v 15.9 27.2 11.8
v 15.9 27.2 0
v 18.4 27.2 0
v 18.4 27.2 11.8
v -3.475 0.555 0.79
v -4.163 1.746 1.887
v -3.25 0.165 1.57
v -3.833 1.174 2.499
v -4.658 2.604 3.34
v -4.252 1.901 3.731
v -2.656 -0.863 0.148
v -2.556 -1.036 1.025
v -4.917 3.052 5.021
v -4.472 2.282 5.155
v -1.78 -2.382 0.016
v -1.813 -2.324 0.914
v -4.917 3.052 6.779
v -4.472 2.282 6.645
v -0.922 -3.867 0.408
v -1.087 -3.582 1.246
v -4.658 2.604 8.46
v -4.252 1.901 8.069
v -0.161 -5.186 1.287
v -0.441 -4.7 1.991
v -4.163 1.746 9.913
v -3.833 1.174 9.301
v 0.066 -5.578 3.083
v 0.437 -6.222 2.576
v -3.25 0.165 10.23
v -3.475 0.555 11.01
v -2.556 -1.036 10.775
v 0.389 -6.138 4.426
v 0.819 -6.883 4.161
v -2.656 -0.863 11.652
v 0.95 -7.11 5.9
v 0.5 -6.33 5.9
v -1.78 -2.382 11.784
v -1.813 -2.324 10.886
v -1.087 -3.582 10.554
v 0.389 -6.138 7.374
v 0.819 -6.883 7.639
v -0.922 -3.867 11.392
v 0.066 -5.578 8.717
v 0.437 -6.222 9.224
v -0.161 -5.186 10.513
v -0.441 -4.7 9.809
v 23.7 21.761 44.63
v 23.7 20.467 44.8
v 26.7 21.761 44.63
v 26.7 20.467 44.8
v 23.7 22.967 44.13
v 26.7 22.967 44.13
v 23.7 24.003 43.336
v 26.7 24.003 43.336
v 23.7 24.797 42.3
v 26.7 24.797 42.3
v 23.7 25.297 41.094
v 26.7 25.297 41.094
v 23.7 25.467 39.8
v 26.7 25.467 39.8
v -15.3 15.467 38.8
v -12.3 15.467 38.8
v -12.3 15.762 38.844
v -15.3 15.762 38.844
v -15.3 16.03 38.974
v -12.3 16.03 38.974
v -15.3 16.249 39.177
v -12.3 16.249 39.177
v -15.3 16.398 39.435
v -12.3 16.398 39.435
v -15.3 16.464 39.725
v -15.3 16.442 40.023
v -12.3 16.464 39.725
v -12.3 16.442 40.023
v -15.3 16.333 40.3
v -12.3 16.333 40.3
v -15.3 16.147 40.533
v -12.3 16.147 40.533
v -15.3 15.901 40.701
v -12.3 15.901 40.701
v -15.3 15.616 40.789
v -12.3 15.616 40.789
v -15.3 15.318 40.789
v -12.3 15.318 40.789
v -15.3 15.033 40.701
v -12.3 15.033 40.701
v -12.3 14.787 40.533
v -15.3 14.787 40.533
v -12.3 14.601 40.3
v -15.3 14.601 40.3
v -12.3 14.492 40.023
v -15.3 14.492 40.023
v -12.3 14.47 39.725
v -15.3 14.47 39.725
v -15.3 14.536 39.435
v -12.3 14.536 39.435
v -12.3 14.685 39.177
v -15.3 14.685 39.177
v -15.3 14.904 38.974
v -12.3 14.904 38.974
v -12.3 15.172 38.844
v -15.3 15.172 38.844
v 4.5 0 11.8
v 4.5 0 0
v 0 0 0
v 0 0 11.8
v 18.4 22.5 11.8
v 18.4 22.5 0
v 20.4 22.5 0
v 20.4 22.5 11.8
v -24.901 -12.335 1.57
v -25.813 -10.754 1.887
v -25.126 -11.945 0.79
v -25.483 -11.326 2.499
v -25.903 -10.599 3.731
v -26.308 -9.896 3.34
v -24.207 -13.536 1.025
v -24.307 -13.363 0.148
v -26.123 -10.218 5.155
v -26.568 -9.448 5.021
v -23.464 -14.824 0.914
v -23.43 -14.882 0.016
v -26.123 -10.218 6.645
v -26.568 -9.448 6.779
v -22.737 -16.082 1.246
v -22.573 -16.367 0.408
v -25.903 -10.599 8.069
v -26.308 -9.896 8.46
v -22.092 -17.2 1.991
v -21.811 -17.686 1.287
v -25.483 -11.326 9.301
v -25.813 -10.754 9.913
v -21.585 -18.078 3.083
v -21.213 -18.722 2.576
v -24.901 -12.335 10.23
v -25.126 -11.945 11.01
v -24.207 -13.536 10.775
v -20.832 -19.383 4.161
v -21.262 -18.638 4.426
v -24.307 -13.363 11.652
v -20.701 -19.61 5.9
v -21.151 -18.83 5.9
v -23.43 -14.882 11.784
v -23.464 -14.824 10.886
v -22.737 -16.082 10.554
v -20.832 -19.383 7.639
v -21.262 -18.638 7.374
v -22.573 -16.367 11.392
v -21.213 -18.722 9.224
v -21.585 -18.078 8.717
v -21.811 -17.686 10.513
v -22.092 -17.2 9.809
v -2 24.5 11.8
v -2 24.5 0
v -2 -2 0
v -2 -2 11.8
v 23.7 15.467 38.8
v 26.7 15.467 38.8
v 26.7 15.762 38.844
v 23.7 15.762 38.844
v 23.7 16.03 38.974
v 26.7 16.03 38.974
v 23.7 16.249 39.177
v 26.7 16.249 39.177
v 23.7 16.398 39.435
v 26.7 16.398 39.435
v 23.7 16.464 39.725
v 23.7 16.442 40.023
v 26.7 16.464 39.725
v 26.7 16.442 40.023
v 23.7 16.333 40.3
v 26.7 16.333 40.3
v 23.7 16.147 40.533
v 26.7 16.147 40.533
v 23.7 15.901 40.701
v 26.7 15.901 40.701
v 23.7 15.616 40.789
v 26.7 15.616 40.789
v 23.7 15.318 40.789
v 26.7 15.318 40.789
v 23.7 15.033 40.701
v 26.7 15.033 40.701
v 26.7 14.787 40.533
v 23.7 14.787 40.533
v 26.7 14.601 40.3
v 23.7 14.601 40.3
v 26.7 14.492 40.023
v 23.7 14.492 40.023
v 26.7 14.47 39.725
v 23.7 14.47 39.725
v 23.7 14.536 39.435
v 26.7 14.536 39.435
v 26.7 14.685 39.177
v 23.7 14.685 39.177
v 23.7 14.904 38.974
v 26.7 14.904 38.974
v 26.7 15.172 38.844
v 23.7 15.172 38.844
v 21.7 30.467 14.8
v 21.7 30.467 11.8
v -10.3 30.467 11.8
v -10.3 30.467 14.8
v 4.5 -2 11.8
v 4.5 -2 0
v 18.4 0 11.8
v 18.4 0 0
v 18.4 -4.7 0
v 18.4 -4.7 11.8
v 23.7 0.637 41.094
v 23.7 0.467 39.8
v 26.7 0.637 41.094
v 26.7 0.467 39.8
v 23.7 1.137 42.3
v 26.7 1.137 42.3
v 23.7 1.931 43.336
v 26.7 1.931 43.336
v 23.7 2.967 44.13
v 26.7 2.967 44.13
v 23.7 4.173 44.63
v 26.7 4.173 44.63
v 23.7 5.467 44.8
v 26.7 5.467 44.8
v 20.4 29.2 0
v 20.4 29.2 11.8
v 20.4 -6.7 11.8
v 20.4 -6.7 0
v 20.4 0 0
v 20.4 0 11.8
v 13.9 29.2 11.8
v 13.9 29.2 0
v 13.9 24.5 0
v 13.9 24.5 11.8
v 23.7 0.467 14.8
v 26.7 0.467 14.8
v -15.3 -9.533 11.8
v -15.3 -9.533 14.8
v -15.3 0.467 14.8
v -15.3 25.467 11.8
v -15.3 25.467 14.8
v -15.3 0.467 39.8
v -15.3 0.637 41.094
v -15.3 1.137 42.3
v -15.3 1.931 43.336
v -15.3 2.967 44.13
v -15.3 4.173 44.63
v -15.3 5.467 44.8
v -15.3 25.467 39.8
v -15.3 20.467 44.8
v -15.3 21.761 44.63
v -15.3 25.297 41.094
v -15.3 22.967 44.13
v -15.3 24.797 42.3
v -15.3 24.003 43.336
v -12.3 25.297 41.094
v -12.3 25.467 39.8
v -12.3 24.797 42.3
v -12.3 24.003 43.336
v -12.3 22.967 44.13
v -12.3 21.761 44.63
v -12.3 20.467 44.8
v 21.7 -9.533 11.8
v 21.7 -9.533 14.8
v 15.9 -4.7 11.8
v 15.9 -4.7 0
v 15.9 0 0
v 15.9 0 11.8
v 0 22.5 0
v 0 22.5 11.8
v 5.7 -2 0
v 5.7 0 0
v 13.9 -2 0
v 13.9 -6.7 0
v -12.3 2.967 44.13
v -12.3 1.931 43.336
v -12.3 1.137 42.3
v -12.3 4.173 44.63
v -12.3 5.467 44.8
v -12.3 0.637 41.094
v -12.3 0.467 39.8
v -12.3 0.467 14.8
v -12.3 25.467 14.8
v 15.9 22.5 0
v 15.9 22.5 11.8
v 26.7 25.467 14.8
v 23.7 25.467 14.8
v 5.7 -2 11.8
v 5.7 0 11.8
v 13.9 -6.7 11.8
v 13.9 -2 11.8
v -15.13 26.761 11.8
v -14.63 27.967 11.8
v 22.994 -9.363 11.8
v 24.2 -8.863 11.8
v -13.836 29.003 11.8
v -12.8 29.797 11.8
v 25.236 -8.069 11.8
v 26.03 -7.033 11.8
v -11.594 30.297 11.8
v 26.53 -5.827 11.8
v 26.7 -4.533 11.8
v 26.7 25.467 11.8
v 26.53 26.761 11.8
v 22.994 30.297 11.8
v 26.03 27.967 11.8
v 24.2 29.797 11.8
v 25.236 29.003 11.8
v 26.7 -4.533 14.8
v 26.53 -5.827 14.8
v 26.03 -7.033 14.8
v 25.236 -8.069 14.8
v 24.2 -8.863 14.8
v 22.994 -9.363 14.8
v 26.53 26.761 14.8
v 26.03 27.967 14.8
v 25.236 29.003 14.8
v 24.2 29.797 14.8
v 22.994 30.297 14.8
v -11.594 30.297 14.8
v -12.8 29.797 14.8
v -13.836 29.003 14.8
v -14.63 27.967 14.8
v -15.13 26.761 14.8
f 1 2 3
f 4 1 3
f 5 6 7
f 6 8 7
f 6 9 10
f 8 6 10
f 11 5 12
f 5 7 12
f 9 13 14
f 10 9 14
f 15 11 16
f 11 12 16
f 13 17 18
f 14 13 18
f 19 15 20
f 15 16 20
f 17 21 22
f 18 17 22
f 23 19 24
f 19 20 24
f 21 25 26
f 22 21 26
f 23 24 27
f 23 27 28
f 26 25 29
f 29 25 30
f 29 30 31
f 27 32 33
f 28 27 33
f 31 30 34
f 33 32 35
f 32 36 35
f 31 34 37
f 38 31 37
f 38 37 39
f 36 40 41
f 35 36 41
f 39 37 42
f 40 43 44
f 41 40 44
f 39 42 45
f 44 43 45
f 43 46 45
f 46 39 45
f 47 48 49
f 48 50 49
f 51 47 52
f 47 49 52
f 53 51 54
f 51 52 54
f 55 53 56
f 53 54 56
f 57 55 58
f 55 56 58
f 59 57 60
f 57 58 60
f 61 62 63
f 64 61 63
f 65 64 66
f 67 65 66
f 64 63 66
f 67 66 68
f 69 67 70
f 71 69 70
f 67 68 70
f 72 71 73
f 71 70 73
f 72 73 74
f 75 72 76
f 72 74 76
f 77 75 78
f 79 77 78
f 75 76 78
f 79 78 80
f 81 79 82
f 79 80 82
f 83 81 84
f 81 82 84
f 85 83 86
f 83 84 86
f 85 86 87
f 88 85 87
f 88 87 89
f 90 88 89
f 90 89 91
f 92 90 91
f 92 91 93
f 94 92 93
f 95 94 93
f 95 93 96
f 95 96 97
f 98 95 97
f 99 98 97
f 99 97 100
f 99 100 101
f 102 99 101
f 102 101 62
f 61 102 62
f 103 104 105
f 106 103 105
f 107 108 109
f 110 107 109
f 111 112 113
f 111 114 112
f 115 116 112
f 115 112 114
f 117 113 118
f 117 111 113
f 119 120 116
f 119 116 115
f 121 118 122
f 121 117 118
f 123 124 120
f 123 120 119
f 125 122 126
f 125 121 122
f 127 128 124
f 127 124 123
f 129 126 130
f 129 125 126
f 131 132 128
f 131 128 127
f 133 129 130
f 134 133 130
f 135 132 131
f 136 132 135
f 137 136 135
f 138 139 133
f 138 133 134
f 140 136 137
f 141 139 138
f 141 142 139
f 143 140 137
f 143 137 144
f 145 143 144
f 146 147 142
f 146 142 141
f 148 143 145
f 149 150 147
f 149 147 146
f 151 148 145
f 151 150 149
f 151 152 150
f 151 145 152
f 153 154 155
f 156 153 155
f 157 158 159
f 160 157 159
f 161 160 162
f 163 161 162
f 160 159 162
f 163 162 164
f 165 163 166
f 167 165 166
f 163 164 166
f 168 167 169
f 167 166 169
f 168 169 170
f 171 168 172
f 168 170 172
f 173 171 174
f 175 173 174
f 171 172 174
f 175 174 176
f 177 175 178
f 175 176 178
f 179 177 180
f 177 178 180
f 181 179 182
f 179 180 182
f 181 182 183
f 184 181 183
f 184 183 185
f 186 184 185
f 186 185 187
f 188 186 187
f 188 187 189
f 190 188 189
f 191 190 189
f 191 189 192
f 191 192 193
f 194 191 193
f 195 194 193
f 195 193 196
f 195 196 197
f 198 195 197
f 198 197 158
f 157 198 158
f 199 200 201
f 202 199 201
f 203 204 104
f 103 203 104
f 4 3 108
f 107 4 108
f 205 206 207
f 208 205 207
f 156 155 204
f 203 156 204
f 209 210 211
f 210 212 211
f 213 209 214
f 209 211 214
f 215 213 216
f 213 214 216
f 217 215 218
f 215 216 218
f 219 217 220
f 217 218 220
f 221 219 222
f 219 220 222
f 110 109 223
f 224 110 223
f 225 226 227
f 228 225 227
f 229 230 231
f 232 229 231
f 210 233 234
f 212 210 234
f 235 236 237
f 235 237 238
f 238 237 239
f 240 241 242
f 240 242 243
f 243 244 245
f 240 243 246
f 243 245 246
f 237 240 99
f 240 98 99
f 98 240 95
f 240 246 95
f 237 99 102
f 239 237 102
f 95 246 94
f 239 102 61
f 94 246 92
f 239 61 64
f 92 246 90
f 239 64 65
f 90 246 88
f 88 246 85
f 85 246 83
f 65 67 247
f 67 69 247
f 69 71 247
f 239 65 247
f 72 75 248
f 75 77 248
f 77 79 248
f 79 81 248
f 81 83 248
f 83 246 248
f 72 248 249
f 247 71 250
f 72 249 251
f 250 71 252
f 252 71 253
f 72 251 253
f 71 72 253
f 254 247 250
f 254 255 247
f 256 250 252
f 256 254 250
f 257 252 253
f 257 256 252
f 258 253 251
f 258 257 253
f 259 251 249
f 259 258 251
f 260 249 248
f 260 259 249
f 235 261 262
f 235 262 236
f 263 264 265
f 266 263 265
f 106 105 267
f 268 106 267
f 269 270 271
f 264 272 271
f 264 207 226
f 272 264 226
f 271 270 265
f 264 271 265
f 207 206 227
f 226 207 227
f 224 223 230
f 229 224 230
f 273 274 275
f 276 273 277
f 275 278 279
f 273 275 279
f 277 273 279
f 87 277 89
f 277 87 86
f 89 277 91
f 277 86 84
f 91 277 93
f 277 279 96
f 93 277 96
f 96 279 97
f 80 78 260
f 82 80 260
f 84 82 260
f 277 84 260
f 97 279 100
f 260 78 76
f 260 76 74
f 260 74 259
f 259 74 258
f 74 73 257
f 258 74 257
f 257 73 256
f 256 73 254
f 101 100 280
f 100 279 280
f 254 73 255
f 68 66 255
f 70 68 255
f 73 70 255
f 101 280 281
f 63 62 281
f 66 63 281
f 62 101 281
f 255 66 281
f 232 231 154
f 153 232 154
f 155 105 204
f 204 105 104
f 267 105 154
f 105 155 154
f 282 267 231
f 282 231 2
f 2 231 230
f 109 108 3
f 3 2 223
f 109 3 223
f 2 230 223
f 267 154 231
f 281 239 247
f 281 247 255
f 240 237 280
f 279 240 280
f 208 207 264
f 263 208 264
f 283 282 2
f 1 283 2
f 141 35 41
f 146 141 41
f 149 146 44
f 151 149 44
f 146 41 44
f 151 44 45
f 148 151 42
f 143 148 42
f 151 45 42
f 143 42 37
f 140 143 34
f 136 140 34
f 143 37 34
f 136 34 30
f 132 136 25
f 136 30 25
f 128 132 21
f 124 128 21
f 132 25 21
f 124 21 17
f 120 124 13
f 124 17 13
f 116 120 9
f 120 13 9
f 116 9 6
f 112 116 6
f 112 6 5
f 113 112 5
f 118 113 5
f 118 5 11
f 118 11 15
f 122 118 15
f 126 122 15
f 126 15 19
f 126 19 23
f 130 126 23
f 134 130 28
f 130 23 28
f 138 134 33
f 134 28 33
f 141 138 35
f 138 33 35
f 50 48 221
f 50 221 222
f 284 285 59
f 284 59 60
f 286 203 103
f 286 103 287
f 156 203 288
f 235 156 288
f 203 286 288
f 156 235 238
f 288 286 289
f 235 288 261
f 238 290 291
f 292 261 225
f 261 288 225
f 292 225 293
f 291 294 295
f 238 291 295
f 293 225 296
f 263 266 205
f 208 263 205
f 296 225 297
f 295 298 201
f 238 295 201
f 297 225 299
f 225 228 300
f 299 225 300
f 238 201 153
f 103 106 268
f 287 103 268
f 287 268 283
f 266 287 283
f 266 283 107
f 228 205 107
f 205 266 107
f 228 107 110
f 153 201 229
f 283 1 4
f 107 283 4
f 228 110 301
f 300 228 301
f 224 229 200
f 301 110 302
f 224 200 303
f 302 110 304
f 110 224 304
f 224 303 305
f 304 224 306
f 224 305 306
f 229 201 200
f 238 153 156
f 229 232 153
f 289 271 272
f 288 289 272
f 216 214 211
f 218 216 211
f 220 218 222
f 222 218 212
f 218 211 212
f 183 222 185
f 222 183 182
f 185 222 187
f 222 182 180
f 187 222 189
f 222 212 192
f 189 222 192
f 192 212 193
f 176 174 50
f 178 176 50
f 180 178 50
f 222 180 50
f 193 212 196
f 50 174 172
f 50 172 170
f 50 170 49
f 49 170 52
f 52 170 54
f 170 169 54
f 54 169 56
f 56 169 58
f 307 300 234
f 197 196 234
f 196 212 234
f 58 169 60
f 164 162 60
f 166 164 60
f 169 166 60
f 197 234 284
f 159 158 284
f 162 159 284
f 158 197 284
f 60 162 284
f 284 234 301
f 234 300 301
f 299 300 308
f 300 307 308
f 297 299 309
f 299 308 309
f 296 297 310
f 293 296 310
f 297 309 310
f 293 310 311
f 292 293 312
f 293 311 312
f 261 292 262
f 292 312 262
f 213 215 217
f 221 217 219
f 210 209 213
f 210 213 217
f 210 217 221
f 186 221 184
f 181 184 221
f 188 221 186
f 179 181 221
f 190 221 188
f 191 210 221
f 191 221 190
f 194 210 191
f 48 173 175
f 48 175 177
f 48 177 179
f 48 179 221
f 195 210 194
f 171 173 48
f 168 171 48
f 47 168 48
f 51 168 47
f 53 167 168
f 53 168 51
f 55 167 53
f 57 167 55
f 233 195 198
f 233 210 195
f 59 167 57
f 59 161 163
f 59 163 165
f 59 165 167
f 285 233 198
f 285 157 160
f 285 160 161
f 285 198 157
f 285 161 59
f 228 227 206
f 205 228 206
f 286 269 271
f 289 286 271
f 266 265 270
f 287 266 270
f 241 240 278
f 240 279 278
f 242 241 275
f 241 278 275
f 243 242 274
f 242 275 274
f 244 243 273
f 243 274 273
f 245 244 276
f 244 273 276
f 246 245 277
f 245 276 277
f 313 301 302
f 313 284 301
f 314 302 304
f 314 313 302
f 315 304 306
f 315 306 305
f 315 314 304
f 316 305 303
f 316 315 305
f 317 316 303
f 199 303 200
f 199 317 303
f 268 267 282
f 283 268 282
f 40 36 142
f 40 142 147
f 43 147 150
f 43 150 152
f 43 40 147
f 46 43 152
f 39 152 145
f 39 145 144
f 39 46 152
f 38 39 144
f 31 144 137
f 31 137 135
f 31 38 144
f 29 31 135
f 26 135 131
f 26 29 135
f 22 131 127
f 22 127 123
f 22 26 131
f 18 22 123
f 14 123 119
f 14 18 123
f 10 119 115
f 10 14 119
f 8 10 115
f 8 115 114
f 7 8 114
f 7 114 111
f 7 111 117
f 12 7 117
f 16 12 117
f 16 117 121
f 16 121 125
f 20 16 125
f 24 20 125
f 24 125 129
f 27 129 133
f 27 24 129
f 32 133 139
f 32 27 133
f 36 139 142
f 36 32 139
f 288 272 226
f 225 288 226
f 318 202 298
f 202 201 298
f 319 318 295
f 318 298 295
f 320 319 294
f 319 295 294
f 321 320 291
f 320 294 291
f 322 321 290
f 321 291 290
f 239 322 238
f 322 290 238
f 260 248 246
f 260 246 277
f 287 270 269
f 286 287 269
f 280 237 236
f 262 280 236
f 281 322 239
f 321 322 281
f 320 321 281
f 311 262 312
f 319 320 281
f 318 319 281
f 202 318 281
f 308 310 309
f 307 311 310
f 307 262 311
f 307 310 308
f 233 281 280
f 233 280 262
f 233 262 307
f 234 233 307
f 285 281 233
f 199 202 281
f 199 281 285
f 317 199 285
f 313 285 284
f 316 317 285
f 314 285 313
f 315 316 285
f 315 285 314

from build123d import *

# Parameters (mm, degrees)
BOSS_EXTRUDE1_DEPTH   = 11.8
BOSS_EXTRUDE1_2_DEPTH = 11.8
BOSS_EXTRUDE2_DEPTH   = 3
SKETCH3_W             = 3
SKETCH3_H             = 25
BOSS_EXTRUDE3_DEPTH   = 30
SKETCH4_R             = 1
CUT_EXTRUDE1_DEPTH    = 53
FILLET1_R             = 5
SKETCH6_R             = 5.9
SKETCH6_R_2           = 5
BOSS_EXTRUDE7_DEPTH   = 25
SKETCH8_W             = 71.563779341
SKETCH8_H             = 7.879641764
SKETCH8_H_2           = 53.845835152
CUT_EXTRUDE2_DEPTH    = 25
SKETCH9_W             = 23.699586064
SKETCH9_H             = 40
CUT_EXTRUDE3_DEPTH    = 3
FILLET2_R             = 5


with BuildPart() as part:
    # Sketch1 → Boss-Extrude1 (new body)
    with BuildSketch(Plane.XY):
        Polygon((4.5, 0), (0, 0), (0, 22.5), (15.9, 22.5), (15.9, 27.2), (18.4, 27.2), (18.4, 22.5), (20.4, 22.5), (20.4, 24.5), (20.4, 29.2), (13.9, 29.2), (13.9, 24.5), (-2, 24.5), (-2, -2), (4.5, -2), align=None)
    extrude(amount=BOSS_EXTRUDE1_DEPTH)



with BuildPart() as body_2:
    # Sketch1 → Boss-Extrude1 2 (new body)
    with BuildSketch(Plane.XY):
        Polygon((20.4, -2), (20.4, 0), (18.4, 0), (18.4, -4.7), (15.9, -4.7), (15.9, 0), (5.7, 0), (5.7, -2), (13.9, -2), (13.9, -6.7), (20.4, -6.7), align=None)
    extrude(amount=BOSS_EXTRUDE1_2_DEPTH)


with BuildPart() as part_1:
    add(part.part)

    add(body_2.part)  # Boss-Extrude2 merges body 2
    # Sketch2 → Boss-Extrude2 (add)
    # profile 1 of 2: a face of its own
    with BuildSketch(Plane.XY.offset(11.8)):
        Polygon((26.7, -11.773069414), (26.7, 36.562844017), (-38.999586064, 36.562844017), (-38.999586064, -56.162231559), (26.7, -56.162231559), align=None)
        Polygon((4.5, -2), (-2, -2), (-2, 24.5), (13.9, 24.5), (13.9, 29.2), (20.4, 29.2), (20.4, 22.5), (18.4, 22.5), (18.4, 27.2), (15.9, 27.2), (15.9, 22.5), (0, 22.5), (0, 0), (4.5, 0), align=None, mode=Mode.SUBTRACT)
    # profile 2 of 2: a face of its own
    with BuildSketch(Plane.XY.offset(11.8)):
        Polygon((-2, 24.5), (-2, -2), (4.5, -2), (4.5, 0), (0, 0), (0, 22.5), (15.9, 22.5), (15.9, 27.2), (18.4, 27.2), (18.4, 22.5), (20.4, 22.5), (20.4, 29.2), (13.9, 29.2), (13.9, 24.5), align=None)
    extrude(amount=BOSS_EXTRUDE2_DEPTH)

    # Sketch3 → Boss-Extrude3 (add)
    with BuildSketch(Plane.XY.offset(14.8)):
        with Locations((-13.8, 12.966976744)):
            Rectangle(SKETCH3_W, SKETCH3_H)
        with Locations((25.2, 12.966976744)):
            Rectangle(SKETCH3_W, SKETCH3_H)
    extrude(amount=BOSS_EXTRUDE3_DEPTH)

    # Sketch4 → Cut-Extrude1 (cut)
    with BuildSketch(Plane(origin=(26.7, 0, 0), x_dir=(0, 0, -1), z_dir=(1, 0, 0))):
        with Locations((-39.8, 15.466976744)):
            Circle(SKETCH4_R)
    extrude(amount=-CUT_EXTRUDE1_DEPTH, mode=Mode.SUBTRACT)

    # Fillet1
    fillet1_edges = [part_1.edges().sort_by_distance(p)[0] for p in [
        (-13.8, 25.466976744, 44.8),
        (-13.8, 0.466976744, 44.8),
        (25.2, 0.466976744, 44.8),
        (25.2, 25.466976744, 44.8),
    ]]
    fillet(fillet1_edges, radius=FILLET1_R)

    # Sketch8 → Cut-Extrude2 (cut)
    with BuildSketch(Plane(origin=(0, 0, 11.8), x_dir=(-1, 0, 0), z_dir=(0, 0, -1))):
        with Locations((6.751034935, 34.406797626)):
            Rectangle(SKETCH8_W, SKETCH8_H)
        with Locations((6.751034935, -36.455940832)):
            Rectangle(SKETCH8_W, SKETCH8_H_2)
    extrude(amount=-CUT_EXTRUDE2_DEPTH, mode=Mode.SUBTRACT)

    # Sketch9 → Cut-Extrude3 (cut)
    with BuildSketch(Plane.XY.offset(14.8)):
        with Locations((-27.149793032, 10.466976744)):
            Rectangle(SKETCH9_W, SKETCH9_H)
    extrude(amount=-CUT_EXTRUDE3_DEPTH, mode=Mode.SUBTRACT)

    # Fillet2
    fillet2_edges = [part_1.edges().sort_by_distance(p)[0] for p in [
        (26.7, -9.533023256, 13.3),
        (26.7, 30.466976744, 13.3),
        (-15.3, 30.466976744, 13.3),
    ]]
    fillet(fillet2_edges, radius=FILLET2_R)


with BuildPart() as body_2_2:
    # Sketch6 → Boss-Extrude7 (new body)
    with BuildSketch(Plane(origin=(-2.366025404, -1.366025404, 0), x_dir=(0, 0, 1), z_dir=(-0.866025403784438, -0.5000000000000012, 0))):
        with Locations(Location((5.9, -0.732050808, 0), (0, 0, 270))):
            Circle(SKETCH6_R)
        with Locations(Location((5.9, -0.732050808, 0), (0, 0, 270))):
            Circle(SKETCH6_R_2, mode=Mode.SUBTRACT)
    extrude(amount=BOSS_EXTRUDE7_DEPTH)


solid = Compound([part_1.part, body_2_2.part])
